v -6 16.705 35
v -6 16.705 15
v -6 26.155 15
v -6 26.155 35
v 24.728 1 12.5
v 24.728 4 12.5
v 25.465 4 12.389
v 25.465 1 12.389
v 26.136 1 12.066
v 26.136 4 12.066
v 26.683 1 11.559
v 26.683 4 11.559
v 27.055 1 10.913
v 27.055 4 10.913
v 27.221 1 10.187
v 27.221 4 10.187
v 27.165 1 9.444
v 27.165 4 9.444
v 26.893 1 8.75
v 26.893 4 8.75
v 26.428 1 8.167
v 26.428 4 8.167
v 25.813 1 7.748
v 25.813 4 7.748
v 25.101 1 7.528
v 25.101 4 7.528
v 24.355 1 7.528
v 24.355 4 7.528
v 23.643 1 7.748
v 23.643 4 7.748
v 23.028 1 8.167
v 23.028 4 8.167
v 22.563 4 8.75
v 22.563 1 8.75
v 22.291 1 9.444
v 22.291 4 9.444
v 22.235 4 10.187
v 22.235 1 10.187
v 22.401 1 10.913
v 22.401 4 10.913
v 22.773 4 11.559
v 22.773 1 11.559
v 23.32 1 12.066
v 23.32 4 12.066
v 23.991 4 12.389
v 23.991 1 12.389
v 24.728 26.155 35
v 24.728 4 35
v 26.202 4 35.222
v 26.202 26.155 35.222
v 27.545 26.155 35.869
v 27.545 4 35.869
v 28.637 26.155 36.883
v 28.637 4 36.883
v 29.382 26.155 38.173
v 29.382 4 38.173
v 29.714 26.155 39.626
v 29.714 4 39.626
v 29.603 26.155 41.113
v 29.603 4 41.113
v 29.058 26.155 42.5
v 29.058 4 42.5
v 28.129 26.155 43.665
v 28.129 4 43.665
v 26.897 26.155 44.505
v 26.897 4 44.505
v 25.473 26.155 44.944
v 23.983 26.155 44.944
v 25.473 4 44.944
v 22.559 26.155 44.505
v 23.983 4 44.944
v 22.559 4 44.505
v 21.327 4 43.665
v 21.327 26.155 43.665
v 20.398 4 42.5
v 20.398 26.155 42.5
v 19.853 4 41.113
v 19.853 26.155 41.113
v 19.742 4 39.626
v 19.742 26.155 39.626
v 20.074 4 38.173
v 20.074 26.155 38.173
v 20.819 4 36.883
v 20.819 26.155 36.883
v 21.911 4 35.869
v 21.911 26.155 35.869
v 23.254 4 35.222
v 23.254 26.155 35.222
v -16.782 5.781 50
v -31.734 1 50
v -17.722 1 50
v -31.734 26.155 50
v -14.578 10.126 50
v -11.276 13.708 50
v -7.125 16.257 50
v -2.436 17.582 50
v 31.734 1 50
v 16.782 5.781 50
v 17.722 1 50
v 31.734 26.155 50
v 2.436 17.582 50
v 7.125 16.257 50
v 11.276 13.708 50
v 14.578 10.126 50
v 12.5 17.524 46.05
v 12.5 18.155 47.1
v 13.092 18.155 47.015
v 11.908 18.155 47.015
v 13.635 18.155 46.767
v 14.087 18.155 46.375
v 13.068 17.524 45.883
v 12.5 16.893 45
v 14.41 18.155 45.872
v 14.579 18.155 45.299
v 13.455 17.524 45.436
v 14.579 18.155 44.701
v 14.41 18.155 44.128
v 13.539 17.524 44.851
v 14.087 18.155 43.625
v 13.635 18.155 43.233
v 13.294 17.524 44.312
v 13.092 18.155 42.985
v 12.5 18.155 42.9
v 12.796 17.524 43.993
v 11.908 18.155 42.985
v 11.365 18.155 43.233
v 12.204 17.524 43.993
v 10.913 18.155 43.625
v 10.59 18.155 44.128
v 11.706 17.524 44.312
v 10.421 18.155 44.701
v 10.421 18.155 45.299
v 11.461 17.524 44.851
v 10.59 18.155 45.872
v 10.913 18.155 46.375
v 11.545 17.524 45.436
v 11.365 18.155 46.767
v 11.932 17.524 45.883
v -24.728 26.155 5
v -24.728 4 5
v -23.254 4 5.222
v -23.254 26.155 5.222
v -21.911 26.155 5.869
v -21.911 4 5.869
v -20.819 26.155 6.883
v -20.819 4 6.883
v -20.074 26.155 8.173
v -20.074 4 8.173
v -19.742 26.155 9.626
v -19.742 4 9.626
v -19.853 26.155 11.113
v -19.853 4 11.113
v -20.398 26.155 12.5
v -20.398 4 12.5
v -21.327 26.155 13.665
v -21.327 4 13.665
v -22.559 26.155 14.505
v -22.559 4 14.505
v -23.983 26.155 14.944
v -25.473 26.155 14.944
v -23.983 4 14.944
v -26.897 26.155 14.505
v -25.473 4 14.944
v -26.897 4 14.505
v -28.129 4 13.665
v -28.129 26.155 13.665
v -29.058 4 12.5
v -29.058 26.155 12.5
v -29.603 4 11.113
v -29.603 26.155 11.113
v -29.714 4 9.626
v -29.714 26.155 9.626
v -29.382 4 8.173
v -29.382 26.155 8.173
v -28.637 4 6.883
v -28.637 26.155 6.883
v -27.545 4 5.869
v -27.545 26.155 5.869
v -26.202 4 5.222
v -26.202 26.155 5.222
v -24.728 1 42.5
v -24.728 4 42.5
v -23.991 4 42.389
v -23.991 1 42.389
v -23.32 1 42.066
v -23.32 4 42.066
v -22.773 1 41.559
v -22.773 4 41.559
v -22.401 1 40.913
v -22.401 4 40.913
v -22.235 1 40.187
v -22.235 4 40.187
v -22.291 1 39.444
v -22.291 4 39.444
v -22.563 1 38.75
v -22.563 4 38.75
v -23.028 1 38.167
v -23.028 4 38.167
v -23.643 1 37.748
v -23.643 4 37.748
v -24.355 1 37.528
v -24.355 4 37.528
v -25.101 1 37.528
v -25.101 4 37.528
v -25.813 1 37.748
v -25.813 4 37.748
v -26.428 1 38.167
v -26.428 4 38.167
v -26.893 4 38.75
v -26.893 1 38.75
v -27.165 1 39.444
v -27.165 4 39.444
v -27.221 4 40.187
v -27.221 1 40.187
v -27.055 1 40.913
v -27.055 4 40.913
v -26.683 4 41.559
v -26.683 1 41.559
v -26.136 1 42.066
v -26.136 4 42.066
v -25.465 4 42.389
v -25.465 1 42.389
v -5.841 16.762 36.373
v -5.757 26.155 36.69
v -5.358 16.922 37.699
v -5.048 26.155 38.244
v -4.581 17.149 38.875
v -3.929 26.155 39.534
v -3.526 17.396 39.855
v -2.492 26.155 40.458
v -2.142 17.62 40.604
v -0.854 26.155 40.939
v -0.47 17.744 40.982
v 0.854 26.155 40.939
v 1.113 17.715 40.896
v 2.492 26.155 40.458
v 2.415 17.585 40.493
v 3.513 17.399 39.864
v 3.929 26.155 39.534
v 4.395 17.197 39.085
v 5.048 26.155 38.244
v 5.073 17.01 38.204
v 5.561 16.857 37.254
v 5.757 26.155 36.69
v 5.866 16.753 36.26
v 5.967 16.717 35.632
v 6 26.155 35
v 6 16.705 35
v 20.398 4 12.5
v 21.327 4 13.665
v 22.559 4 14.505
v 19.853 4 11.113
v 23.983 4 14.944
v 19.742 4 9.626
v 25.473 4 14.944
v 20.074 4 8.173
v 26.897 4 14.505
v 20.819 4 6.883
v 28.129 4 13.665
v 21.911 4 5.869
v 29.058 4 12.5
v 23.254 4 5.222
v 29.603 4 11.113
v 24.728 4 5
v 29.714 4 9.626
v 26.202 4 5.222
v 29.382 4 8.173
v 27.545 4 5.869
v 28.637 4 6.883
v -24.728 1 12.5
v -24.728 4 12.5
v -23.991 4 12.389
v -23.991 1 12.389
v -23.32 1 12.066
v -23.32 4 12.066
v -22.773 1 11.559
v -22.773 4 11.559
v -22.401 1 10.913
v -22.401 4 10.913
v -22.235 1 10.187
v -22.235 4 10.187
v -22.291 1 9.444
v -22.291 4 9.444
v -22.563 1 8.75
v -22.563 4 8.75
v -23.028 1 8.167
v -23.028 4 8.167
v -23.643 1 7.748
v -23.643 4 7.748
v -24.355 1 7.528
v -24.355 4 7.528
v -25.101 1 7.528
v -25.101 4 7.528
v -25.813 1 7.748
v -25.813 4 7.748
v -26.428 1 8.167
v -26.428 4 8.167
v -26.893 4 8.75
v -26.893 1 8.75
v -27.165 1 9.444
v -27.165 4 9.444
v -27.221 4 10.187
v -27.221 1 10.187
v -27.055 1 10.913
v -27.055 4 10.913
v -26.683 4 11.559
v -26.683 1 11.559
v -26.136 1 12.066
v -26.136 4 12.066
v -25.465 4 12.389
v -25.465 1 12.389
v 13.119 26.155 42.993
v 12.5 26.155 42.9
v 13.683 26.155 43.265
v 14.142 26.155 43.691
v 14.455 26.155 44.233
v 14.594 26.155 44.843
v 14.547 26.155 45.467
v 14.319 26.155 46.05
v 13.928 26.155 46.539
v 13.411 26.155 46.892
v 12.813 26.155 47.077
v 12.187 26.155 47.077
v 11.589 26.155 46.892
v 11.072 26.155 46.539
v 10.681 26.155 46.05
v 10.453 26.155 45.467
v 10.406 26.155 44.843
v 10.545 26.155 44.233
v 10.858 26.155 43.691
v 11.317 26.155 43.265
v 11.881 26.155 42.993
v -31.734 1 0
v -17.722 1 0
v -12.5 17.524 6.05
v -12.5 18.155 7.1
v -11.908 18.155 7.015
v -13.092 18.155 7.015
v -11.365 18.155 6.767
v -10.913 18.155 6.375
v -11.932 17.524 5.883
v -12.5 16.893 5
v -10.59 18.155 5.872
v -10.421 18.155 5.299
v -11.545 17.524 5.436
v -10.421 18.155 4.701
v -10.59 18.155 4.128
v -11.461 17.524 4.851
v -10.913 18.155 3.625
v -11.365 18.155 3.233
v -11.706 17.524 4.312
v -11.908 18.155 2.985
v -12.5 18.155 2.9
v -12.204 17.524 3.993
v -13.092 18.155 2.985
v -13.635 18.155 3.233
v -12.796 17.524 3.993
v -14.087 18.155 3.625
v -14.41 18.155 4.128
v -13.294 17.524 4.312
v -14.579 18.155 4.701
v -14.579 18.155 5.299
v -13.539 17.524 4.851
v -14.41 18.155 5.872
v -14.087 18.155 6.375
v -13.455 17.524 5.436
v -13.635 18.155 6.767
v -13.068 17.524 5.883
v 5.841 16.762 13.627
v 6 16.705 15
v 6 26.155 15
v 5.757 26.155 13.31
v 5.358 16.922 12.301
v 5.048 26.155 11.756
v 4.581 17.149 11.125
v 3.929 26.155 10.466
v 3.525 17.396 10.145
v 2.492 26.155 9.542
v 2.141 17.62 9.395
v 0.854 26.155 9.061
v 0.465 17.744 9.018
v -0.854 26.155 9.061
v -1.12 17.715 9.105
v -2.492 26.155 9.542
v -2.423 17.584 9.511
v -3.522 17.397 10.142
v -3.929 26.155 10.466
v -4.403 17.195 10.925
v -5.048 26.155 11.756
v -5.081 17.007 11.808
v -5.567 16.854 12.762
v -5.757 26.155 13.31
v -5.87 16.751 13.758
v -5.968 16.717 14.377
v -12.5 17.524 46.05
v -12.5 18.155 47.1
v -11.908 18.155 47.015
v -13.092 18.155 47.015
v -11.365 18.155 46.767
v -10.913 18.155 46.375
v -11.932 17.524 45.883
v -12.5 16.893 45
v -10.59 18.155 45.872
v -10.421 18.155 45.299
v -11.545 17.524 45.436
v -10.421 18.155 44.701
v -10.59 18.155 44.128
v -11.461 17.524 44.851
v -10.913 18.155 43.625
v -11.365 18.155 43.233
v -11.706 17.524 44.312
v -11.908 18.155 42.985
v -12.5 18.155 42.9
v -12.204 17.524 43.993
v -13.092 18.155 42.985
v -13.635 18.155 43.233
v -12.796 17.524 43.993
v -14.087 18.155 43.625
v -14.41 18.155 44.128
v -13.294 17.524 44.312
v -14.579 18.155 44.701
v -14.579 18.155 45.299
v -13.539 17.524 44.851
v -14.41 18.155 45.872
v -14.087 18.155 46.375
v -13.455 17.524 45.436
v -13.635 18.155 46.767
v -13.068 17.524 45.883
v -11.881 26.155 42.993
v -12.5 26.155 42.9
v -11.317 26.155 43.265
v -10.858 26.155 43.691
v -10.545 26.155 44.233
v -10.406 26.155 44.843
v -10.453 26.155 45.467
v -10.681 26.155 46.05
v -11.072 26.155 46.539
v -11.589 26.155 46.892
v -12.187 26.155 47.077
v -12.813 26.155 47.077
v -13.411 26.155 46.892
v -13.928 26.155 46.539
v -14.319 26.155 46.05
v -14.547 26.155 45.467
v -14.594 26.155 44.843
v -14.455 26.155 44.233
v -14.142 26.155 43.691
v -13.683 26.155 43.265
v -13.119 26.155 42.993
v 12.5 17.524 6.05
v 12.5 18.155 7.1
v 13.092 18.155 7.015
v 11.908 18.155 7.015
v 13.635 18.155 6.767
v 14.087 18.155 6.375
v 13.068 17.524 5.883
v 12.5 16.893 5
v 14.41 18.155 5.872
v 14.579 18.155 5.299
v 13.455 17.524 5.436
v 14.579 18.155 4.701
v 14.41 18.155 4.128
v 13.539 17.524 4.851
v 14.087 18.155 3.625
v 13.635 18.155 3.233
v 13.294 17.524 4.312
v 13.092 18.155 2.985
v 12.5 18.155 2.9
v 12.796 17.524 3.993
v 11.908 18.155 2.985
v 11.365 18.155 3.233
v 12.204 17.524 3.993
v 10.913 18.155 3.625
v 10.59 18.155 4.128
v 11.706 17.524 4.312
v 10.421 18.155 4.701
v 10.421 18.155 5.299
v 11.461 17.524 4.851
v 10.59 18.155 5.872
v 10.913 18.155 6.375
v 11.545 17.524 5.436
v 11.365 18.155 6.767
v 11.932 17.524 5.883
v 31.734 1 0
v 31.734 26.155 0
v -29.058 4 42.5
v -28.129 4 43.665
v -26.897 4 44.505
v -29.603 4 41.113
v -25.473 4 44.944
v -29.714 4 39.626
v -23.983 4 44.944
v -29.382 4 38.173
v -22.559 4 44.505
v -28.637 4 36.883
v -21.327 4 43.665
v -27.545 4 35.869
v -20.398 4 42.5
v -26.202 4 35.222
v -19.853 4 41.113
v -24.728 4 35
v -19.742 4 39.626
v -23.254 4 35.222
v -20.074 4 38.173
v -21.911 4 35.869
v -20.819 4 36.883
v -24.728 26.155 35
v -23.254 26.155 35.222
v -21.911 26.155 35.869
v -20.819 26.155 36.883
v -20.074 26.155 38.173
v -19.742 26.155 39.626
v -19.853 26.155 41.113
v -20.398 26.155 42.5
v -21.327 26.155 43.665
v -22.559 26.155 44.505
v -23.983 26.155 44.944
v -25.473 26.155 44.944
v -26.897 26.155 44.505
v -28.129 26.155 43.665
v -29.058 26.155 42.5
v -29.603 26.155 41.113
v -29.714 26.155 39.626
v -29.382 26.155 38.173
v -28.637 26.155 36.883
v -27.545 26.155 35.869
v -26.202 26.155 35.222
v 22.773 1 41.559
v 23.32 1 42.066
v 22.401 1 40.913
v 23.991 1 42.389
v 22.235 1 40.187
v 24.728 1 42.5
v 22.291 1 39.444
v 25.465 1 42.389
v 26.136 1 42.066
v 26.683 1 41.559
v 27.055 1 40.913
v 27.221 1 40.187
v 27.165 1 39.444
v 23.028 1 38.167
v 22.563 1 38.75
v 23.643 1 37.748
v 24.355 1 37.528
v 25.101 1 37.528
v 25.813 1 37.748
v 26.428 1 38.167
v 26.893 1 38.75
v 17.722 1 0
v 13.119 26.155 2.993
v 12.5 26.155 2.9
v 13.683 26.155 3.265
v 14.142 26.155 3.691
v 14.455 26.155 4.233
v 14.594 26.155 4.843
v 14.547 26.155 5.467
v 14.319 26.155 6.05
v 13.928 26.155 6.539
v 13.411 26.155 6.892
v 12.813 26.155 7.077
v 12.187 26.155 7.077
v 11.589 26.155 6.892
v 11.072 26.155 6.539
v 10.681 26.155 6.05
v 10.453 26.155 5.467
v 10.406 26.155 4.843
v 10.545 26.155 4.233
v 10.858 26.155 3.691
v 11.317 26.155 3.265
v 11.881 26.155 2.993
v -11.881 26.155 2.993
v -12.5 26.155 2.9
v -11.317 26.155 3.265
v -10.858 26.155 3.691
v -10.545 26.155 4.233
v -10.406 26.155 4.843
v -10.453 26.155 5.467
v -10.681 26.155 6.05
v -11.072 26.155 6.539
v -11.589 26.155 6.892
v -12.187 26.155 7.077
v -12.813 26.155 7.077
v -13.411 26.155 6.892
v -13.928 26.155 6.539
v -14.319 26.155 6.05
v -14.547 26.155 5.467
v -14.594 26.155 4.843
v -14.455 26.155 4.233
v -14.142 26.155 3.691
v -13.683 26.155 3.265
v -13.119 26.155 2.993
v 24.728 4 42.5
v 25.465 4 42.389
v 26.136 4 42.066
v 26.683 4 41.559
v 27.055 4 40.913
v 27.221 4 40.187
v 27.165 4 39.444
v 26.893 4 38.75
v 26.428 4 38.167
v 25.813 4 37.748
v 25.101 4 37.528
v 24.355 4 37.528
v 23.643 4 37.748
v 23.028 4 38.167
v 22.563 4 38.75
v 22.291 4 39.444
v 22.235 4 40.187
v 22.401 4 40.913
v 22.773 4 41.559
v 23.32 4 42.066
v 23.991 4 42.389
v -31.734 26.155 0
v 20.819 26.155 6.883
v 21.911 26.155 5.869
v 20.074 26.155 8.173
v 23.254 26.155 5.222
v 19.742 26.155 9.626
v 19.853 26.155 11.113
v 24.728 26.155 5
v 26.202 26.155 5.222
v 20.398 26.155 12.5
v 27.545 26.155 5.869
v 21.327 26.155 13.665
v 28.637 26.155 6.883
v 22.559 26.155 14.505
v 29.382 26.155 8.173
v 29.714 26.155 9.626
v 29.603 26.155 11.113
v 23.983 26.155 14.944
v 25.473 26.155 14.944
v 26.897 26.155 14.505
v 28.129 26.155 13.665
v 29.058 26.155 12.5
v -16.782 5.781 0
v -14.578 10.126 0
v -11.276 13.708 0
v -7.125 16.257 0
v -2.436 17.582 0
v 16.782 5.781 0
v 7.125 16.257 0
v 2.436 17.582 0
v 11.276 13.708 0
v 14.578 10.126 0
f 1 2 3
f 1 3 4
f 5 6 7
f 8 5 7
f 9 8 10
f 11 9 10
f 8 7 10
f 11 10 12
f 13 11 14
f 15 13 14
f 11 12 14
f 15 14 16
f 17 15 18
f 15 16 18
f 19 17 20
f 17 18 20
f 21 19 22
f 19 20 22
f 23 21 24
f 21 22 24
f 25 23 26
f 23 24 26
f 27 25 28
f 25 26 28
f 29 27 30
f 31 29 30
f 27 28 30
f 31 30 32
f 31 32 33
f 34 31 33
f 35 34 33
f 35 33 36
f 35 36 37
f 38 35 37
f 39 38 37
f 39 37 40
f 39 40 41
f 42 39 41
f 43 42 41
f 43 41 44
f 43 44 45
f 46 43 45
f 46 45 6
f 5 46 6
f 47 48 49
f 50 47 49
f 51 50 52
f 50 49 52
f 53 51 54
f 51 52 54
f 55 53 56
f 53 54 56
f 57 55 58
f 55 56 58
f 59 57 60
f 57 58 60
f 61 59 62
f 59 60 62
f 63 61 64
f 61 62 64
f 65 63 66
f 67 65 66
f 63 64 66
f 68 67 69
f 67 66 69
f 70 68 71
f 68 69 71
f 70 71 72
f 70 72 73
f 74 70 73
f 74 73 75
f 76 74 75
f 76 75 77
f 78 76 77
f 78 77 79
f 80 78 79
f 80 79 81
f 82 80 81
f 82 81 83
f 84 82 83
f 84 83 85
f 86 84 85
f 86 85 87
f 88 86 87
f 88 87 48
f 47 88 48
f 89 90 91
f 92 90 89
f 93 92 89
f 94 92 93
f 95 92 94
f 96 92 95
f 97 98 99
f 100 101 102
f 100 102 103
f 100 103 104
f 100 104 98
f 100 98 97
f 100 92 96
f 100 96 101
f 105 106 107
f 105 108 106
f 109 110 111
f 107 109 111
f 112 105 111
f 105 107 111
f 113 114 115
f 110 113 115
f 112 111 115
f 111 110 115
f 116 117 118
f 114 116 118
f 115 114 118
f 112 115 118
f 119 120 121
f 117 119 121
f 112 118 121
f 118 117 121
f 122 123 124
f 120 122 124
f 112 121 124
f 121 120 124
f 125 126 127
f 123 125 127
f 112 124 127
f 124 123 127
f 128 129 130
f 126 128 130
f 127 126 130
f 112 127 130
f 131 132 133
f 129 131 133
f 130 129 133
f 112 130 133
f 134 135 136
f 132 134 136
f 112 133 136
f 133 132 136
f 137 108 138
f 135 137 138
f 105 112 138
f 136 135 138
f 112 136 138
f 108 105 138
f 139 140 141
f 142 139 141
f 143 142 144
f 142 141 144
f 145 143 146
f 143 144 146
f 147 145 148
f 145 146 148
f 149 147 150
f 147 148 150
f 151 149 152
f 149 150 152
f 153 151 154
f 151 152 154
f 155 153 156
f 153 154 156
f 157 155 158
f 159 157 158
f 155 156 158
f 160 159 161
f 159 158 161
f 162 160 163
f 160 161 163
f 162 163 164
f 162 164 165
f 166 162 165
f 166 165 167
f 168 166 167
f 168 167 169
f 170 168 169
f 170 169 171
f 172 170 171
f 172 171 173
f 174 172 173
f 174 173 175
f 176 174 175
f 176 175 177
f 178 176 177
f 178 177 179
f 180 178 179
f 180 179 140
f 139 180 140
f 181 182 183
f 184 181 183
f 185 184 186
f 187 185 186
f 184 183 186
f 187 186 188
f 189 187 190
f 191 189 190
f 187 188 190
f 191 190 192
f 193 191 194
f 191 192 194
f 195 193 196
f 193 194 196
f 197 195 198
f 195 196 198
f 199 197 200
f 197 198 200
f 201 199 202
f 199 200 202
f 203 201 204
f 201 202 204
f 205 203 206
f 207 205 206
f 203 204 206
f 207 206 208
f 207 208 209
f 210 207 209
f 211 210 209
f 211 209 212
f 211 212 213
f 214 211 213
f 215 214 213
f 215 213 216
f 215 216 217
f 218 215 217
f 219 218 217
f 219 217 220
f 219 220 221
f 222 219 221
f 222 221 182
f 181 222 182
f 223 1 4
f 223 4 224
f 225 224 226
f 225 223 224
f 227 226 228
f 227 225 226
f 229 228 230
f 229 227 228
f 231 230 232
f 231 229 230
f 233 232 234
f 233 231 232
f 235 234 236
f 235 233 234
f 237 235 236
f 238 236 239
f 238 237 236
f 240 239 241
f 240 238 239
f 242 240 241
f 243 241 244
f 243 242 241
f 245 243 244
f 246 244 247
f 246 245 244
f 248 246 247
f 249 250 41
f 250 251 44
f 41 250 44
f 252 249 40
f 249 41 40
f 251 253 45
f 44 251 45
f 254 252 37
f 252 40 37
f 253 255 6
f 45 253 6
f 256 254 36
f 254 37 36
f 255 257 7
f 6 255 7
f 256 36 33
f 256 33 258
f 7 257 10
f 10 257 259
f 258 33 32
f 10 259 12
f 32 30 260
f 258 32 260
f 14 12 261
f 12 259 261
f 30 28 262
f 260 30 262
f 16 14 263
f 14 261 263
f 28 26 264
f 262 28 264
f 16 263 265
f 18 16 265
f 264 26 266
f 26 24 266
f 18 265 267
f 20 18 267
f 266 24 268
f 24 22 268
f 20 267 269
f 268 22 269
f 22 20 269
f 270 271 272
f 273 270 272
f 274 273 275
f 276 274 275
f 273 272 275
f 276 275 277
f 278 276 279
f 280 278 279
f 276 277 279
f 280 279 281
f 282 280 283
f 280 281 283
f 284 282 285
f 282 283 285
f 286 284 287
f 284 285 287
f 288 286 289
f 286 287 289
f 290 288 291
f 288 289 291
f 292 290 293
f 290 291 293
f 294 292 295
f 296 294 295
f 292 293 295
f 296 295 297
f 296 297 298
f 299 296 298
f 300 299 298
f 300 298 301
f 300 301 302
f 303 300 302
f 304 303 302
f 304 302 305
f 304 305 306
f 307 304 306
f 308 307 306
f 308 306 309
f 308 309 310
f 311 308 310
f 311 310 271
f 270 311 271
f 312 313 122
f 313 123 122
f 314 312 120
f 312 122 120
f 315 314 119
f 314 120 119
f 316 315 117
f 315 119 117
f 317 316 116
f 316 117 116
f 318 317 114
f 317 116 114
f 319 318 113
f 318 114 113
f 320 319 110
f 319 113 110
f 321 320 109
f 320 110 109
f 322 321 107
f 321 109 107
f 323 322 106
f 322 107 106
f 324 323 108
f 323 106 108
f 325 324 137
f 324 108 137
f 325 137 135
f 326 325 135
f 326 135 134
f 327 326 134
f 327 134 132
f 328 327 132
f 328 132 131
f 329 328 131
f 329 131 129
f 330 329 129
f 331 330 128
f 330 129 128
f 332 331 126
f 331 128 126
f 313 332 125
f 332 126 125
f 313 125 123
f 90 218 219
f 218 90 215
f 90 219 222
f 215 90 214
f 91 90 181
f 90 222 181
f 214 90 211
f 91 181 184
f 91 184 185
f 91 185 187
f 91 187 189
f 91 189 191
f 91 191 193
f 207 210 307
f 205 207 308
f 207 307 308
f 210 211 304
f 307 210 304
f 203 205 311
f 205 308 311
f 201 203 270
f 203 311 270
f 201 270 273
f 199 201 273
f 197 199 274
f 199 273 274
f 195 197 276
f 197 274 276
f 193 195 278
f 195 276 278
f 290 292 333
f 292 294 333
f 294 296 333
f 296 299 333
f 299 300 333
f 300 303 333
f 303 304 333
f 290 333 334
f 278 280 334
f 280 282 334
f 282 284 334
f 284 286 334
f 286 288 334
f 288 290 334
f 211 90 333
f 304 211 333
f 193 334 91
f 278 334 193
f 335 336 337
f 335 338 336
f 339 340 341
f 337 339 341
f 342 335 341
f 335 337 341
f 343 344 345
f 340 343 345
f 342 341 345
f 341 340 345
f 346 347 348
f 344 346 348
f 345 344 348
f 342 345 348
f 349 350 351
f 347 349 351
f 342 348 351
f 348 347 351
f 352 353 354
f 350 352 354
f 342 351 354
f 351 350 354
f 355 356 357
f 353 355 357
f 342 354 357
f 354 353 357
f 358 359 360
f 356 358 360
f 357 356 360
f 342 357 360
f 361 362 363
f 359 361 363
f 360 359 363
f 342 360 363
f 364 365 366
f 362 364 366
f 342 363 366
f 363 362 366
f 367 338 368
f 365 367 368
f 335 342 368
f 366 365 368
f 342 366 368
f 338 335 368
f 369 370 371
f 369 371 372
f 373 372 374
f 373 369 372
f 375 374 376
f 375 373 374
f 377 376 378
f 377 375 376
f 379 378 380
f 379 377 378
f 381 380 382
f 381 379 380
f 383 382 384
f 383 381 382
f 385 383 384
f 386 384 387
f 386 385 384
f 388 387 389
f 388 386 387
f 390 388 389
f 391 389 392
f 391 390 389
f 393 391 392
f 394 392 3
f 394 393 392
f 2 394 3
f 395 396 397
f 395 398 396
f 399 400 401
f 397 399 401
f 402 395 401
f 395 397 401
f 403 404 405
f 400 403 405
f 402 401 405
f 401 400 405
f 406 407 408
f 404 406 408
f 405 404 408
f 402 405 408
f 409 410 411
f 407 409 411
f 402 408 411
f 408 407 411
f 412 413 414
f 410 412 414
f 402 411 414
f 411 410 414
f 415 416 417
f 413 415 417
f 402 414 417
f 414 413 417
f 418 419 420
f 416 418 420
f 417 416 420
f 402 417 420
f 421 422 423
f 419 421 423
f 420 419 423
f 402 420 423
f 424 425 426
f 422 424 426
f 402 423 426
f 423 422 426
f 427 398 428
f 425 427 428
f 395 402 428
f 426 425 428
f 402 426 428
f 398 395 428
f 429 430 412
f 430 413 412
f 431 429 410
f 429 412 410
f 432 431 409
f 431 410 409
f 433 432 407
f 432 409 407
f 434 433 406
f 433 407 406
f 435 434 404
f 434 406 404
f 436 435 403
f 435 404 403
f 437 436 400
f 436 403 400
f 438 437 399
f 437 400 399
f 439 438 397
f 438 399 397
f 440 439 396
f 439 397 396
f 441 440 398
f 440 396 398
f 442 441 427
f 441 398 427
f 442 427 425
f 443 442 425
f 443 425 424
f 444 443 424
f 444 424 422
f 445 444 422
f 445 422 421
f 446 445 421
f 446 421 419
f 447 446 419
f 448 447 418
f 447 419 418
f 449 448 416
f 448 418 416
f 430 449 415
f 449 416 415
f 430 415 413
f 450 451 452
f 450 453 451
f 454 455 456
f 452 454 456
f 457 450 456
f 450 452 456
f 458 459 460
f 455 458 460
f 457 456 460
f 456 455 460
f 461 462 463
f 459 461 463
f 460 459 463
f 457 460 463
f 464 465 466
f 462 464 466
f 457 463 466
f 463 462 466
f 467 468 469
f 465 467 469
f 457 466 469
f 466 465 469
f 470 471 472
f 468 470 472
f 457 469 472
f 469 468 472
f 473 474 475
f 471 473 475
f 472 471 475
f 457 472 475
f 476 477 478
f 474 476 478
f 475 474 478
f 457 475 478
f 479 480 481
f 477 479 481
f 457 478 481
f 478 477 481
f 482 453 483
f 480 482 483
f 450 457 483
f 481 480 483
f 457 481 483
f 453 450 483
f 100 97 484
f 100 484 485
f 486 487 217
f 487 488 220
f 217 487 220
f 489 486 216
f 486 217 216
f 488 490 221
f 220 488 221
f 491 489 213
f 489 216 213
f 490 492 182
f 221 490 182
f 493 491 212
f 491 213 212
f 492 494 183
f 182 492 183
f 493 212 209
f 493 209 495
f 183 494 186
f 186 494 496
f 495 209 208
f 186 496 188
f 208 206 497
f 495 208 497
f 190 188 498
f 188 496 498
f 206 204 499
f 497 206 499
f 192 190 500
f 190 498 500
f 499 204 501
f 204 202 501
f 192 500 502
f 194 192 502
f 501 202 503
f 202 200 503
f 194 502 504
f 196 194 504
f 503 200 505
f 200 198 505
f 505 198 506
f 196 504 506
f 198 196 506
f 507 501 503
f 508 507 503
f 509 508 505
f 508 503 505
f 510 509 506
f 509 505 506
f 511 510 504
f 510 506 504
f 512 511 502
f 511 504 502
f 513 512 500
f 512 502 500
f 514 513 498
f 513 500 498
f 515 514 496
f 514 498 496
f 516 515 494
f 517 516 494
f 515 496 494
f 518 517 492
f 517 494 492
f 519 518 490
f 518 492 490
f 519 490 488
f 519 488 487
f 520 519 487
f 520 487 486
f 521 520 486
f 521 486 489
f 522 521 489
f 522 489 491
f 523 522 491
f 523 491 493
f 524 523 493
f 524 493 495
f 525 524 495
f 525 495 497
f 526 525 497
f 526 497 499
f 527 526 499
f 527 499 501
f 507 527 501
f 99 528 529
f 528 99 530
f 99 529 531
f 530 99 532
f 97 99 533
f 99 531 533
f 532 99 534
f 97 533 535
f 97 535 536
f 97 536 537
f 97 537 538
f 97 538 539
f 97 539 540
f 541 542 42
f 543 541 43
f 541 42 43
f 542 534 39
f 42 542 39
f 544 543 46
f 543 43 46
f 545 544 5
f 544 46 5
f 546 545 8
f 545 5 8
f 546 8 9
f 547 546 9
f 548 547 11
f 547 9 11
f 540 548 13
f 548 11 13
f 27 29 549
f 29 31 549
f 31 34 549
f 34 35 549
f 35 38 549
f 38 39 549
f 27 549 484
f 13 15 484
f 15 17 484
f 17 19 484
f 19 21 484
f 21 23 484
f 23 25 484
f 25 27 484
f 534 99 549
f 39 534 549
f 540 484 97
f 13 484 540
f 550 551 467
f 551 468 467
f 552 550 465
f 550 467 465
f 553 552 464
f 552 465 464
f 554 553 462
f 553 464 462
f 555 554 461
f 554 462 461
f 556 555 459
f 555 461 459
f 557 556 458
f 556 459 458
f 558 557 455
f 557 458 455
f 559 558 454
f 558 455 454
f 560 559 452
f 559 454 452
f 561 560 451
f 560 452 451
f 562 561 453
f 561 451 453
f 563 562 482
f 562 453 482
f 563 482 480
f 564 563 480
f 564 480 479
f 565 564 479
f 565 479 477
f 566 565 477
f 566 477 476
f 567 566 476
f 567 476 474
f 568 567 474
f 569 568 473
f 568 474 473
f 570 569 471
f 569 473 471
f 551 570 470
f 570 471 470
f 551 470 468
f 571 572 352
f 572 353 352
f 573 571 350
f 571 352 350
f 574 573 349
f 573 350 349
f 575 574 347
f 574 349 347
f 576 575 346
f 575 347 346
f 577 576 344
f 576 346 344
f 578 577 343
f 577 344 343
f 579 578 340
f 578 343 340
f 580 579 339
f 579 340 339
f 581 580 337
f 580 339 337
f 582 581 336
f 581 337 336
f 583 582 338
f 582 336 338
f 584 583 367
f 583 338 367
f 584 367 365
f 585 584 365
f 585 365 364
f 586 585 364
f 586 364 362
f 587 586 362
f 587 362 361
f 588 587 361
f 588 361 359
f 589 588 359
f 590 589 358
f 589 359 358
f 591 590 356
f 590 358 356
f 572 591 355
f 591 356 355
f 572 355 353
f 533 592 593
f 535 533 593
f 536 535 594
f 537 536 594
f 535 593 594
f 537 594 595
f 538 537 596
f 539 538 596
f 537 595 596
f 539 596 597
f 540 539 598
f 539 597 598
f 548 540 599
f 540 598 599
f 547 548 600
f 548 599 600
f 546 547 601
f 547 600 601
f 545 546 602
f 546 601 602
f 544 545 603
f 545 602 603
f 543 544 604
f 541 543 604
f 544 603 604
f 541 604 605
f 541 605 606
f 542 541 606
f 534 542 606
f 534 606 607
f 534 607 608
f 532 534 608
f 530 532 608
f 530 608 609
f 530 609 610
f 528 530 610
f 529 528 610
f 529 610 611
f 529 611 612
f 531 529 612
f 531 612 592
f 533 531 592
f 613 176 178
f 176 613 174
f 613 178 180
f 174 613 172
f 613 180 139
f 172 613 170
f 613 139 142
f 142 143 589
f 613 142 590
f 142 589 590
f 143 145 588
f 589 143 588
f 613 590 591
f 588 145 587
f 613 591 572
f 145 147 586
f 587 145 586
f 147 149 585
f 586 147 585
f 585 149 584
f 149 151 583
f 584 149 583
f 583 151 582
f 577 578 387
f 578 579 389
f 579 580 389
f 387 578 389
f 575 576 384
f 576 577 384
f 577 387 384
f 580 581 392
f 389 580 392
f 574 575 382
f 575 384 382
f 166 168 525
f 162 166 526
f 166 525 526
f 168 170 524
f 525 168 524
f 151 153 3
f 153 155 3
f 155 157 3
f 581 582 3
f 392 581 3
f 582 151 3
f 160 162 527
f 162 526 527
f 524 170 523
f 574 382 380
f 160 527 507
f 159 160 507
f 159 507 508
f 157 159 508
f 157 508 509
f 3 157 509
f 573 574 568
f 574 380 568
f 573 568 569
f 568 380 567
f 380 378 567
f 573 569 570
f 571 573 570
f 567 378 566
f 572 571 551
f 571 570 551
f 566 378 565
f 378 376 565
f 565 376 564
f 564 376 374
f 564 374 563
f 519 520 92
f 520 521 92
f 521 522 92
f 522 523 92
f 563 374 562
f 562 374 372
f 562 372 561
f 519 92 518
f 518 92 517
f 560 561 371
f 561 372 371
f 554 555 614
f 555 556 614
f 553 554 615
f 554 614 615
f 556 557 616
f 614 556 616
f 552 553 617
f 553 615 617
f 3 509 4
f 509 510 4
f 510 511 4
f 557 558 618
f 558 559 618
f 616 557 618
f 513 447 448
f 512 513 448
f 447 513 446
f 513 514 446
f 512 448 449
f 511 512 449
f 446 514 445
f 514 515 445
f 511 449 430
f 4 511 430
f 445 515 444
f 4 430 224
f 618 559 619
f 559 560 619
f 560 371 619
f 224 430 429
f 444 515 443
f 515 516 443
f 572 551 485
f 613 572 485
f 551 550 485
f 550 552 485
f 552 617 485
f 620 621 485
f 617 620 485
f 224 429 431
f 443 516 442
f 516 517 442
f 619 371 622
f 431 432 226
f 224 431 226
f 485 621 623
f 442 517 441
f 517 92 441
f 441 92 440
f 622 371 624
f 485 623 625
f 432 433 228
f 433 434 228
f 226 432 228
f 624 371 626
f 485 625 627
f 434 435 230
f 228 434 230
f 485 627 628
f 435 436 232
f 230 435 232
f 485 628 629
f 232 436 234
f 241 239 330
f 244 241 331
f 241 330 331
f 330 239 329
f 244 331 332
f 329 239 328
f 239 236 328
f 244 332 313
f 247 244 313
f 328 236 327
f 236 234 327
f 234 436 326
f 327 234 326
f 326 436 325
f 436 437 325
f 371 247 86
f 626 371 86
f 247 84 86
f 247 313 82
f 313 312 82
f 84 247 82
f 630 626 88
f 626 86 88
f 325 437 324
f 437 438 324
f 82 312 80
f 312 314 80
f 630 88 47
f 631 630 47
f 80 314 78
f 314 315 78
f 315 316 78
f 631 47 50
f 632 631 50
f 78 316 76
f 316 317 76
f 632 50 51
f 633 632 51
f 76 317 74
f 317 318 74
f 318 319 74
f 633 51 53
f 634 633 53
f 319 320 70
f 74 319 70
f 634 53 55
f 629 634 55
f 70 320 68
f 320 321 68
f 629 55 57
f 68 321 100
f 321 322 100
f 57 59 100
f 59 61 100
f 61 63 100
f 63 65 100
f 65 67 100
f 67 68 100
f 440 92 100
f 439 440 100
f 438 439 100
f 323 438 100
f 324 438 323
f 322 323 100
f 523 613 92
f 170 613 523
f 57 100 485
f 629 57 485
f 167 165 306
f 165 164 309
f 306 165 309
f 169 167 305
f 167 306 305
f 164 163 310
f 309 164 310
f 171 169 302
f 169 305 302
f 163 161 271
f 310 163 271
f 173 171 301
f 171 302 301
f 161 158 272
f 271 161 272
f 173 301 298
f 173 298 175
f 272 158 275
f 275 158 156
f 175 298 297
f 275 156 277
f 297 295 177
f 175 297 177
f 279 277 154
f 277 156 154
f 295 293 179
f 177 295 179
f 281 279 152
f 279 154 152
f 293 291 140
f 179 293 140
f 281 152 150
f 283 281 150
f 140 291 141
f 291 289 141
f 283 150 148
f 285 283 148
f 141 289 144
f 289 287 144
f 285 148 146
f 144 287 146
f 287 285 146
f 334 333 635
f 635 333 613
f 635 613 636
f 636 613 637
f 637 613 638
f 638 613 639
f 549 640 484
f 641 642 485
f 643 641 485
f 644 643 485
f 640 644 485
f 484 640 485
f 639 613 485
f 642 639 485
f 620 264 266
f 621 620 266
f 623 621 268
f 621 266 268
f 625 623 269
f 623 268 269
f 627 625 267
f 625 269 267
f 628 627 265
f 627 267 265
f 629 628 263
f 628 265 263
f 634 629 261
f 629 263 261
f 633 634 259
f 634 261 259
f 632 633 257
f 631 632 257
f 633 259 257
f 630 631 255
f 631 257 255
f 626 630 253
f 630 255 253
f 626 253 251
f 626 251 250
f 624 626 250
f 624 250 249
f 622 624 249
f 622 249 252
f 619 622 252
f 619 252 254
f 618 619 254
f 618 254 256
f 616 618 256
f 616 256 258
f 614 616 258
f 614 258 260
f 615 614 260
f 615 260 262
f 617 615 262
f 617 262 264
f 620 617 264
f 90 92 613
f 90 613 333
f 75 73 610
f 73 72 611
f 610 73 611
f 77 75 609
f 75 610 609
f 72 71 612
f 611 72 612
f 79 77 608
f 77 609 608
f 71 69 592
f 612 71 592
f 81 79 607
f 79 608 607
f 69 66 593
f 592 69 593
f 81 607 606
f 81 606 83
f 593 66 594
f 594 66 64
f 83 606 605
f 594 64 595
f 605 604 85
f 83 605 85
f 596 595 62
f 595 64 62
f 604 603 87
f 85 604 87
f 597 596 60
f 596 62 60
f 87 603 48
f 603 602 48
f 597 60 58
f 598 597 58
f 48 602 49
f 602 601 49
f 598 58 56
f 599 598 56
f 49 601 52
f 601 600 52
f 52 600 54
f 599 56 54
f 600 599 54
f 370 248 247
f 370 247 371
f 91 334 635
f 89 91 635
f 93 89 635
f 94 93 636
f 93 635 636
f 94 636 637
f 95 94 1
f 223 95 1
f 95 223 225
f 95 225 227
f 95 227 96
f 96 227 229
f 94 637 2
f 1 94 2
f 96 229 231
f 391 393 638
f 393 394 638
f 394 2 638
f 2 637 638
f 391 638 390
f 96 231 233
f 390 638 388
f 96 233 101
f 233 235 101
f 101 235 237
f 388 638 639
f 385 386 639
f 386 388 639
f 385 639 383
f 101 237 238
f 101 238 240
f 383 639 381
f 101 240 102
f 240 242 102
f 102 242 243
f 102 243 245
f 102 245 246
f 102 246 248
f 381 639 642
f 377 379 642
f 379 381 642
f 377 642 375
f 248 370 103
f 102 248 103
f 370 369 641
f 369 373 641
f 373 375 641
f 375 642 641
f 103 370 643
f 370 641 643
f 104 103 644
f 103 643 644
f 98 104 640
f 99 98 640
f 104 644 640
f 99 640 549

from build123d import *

# Parameters (mm, degrees)
BOSS_EXTRUDE1_DEPTH             = 50
BOSS_EXTRUDE2_START             = -50
BOSS_EXTRUDE2_DEPTH             = 50
F_5_0MM_CLEARANCE_DOWEL_HOLE1_D = 5
CUT_EXTRUDE1_REACH              = 67.4
SKETCH4_R                       = 5
CUT_EXTRUDE2_REACH              = 68.728
CUT_EXTRUDE3_DEPTH              = 68.194679971
TAP_DRILL_FOR_M5X0_8_TAP1_D     = 4.2
TAP_DRILL_FOR_M5X0_8_TAP1_DEPTH = 8
TAP_DRILL_FOR_M5X0_8_TAP1_TIP   = 1.2618073


with BuildPart() as part:
    # Sketch1 → Boss-Extrude1 (new body)
    with BuildSketch(Plane.XY):
        with BuildLine():
            Line((-31.734248061, 1), (-17.721808598, 1))
            ThreePointArc((-17.721808598, 1), (0, 17.75), (17.721808598, 1))
            Line((17.721808598, 1), (31.734248061, 1))
            ThreePointArc((31.734248061, 1), (0, 31.75), (-31.734248061, 1))
        make_face()
    extrude(amount=BOSS_EXTRUDE1_DEPTH)

    # Sketch9 → Boss-Extrude2 (add)
    with BuildSketch(Plane.XY.offset(50).offset(BOSS_EXTRUDE2_START)):
        with BuildLine():
            Line((31.734248061, 31.75), (0, 31.75))
            ThreePointArc((0, 31.75), (22.094258304, 22.801452805), (31.734248061, 1))
            Line((31.734248061, 1), (31.734248061, 31.75))
        make_face()
        with BuildLine():
            Line((-31.734248061, 31.75), (-31.734248061, 1))
            ThreePointArc((-31.734248061, 1), (-22.094258304, 22.801452805), (0, 31.75))
            Line((0, 31.75), (-31.734248061, 31.75))
        make_face()
    extrude(amount=BOSS_EXTRUDE2_DEPTH)

    # Ø5.0mm Clearance Dowel Hole1 (through all)
    with Locations(Plane(origin=(-24.72802833, 1, 40), x_dir=(0, 0, -1), z_dir=(0, -1, 0))):
        with Locations((0, 0), (30, 0), (0, 49.45605666), (30, 49.45605666)):
            Hole(F_5_0MM_CLEARANCE_DOWEL_HOLE1_D / 2)

    # Sketch4 → Cut-Extrude1 (cut, up to next)
    with BuildSketch(Plane(origin=(0, 4, 0), x_dir=(-1, 0, 0), z_dir=(0, -1, 0)), mode=Mode.PRIVATE) as cut_extrude1_sk1:
        with Locations(Location((24.72802833, -40, 0), (0, 0, 90))):
            Circle(SKETCH4_R)
    cut_extrude1_tool1 = extrude(cut_extrude1_sk1.sketch, amount=-CUT_EXTRUDE1_REACH, mode=Mode.PRIVATE) & part.part
    # Sketch4 → Cut-Extrude1 (cut, up to next)
    with BuildSketch(Plane(origin=(0, 4, 0), x_dir=(-1, 0, 0), z_dir=(0, -1, 0)), mode=Mode.PRIVATE) as cut_extrude1_sk2:
        with Locations(Location((24.72802833, -10, 0), (0, 0, 90))):
            Circle(SKETCH4_R)
    cut_extrude1_tool2 = extrude(cut_extrude1_sk2.sketch, amount=-CUT_EXTRUDE1_REACH, mode=Mode.PRIVATE) & part.part
    # Sketch4 → Cut-Extrude1 (cut, up to next)
    with BuildSketch(Plane(origin=(0, 4, 0), x_dir=(-1, 0, 0), z_dir=(0, -1, 0)), mode=Mode.PRIVATE) as cut_extrude1_sk3:
        with Locations(Location((-24.72802833, -10, 0), (0, 0, 90))):
            Circle(SKETCH4_R)
    cut_extrude1_tool3 = extrude(cut_extrude1_sk3.sketch, amount=-CUT_EXTRUDE1_REACH, mode=Mode.PRIVATE) & part.part
    # Sketch4 → Cut-Extrude1 (cut, up to next)
    with BuildSketch(Plane(origin=(0, 4, 0), x_dir=(-1, 0, 0), z_dir=(0, -1, 0)), mode=Mode.PRIVATE) as cut_extrude1_sk4:
        with Locations(Location((-24.72802833, -40, 0), (0, 0, 90))):
            Circle(SKETCH4_R)
    cut_extrude1_tool4 = extrude(cut_extrude1_sk4.sketch, amount=-CUT_EXTRUDE1_REACH, mode=Mode.PRIVATE) & part.part
    add(cut_extrude1_tool1.solids().sort_by_distance((-24.728028, 4, 40))[0], mode=Mode.SUBTRACT)
    add(cut_extrude1_tool2.solids().sort_by_distance((-24.728028, 4, 10))[0], mode=Mode.SUBTRACT)
    add(cut_extrude1_tool3.solids().sort_by_distance((24.728028, 4, 10))[0], mode=Mode.SUBTRACT)
    add(cut_extrude1_tool4.solids().sort_by_distance((24.728028, 4, 40))[0], mode=Mode.SUBTRACT)

    # Sketch5 → Cut-Extrude2 (cut, up to next)
    with BuildSketch(Plane(origin=(0, 1, 0), x_dir=(-1, 0, 0), z_dir=(0, -1, 0)), mode=Mode.PRIVATE) as cut_extrude2_sk1:
        with BuildLine():
            Line((-6, -35), (-6, -15))
            ThreePointArc((-6, -15), (0, -9), (6, -15))
            Line((6, -15), (6, -35))
            ThreePointArc((6, -35), (0, -41), (-6, -35))
        make_face()
    cut_extrude2_tool1 = extrude(cut_extrude2_sk1.sketch, amount=-CUT_EXTRUDE2_REACH, mode=Mode.PRIVATE) & part.part
    add(cut_extrude2_tool1.solids().sort_by_distance((0, 1, 25))[0], mode=Mode.SUBTRACT)

    # Sketch6 → Cut-Extrude3 (cut, through all)
    with BuildSketch(Plane.XY.offset(50)):
        with BuildLine():
            ThreePointArc((0, 31.75), (9.424816043, 30.318894151), (18, 26.154588508))
            Line((18, 26.154588508), (31.734248061, 26.154588508))
            Line((31.734248061, 26.154588508), (31.734248061, 31.75))
            Line((31.734248061, 31.75), (0, 31.75))
        make_face()
        with BuildLine():
            Line((18, 26.154588508), (-18, 26.154588508))
            ThreePointArc((-18, 26.154588508), (0, 31.75), (18, 26.154588508))
        make_face()
        with BuildLine():
            Line((-31.734248061, 26.154588508), (-18, 26.154588508))
            ThreePointArc((-18, 26.154588508), (-9.424816043, 30.318894151), (0, 31.75))
            Line((0, 31.75), (-31.734248061, 31.75))
            Line((-31.734248061, 31.75), (-31.734248061, 26.154588508))
        make_face()
    extrude(amount=-CUT_EXTRUDE3_DEPTH, mode=Mode.SUBTRACT)

    # Tap Drill for M5x0.8 Tap1
    with Locations(Plane(origin=(-12.5, 26.154588508, 5), x_dir=(0, 0, 1), z_dir=(0, 1, 0))):
        with Locations((0, 0), (40, 0), (40, 25), (0, 25)):
            Hole(TAP_DRILL_FOR_M5X0_8_TAP1_D / 2, depth=TAP_DRILL_FOR_M5X0_8_TAP1_DEPTH)
            with Locations((0, 0, -(TAP_DRILL_FOR_M5X0_8_TAP1_DEPTH + TAP_DRILL_FOR_M5X0_8_TAP1_TIP / 2))):  # 118° drill point
                Cone(0, TAP_DRILL_FOR_M5X0_8_TAP1_D / 2, TAP_DRILL_FOR_M5X0_8_TAP1_TIP, mode=Mode.SUBTRACT)


solid = part.part
